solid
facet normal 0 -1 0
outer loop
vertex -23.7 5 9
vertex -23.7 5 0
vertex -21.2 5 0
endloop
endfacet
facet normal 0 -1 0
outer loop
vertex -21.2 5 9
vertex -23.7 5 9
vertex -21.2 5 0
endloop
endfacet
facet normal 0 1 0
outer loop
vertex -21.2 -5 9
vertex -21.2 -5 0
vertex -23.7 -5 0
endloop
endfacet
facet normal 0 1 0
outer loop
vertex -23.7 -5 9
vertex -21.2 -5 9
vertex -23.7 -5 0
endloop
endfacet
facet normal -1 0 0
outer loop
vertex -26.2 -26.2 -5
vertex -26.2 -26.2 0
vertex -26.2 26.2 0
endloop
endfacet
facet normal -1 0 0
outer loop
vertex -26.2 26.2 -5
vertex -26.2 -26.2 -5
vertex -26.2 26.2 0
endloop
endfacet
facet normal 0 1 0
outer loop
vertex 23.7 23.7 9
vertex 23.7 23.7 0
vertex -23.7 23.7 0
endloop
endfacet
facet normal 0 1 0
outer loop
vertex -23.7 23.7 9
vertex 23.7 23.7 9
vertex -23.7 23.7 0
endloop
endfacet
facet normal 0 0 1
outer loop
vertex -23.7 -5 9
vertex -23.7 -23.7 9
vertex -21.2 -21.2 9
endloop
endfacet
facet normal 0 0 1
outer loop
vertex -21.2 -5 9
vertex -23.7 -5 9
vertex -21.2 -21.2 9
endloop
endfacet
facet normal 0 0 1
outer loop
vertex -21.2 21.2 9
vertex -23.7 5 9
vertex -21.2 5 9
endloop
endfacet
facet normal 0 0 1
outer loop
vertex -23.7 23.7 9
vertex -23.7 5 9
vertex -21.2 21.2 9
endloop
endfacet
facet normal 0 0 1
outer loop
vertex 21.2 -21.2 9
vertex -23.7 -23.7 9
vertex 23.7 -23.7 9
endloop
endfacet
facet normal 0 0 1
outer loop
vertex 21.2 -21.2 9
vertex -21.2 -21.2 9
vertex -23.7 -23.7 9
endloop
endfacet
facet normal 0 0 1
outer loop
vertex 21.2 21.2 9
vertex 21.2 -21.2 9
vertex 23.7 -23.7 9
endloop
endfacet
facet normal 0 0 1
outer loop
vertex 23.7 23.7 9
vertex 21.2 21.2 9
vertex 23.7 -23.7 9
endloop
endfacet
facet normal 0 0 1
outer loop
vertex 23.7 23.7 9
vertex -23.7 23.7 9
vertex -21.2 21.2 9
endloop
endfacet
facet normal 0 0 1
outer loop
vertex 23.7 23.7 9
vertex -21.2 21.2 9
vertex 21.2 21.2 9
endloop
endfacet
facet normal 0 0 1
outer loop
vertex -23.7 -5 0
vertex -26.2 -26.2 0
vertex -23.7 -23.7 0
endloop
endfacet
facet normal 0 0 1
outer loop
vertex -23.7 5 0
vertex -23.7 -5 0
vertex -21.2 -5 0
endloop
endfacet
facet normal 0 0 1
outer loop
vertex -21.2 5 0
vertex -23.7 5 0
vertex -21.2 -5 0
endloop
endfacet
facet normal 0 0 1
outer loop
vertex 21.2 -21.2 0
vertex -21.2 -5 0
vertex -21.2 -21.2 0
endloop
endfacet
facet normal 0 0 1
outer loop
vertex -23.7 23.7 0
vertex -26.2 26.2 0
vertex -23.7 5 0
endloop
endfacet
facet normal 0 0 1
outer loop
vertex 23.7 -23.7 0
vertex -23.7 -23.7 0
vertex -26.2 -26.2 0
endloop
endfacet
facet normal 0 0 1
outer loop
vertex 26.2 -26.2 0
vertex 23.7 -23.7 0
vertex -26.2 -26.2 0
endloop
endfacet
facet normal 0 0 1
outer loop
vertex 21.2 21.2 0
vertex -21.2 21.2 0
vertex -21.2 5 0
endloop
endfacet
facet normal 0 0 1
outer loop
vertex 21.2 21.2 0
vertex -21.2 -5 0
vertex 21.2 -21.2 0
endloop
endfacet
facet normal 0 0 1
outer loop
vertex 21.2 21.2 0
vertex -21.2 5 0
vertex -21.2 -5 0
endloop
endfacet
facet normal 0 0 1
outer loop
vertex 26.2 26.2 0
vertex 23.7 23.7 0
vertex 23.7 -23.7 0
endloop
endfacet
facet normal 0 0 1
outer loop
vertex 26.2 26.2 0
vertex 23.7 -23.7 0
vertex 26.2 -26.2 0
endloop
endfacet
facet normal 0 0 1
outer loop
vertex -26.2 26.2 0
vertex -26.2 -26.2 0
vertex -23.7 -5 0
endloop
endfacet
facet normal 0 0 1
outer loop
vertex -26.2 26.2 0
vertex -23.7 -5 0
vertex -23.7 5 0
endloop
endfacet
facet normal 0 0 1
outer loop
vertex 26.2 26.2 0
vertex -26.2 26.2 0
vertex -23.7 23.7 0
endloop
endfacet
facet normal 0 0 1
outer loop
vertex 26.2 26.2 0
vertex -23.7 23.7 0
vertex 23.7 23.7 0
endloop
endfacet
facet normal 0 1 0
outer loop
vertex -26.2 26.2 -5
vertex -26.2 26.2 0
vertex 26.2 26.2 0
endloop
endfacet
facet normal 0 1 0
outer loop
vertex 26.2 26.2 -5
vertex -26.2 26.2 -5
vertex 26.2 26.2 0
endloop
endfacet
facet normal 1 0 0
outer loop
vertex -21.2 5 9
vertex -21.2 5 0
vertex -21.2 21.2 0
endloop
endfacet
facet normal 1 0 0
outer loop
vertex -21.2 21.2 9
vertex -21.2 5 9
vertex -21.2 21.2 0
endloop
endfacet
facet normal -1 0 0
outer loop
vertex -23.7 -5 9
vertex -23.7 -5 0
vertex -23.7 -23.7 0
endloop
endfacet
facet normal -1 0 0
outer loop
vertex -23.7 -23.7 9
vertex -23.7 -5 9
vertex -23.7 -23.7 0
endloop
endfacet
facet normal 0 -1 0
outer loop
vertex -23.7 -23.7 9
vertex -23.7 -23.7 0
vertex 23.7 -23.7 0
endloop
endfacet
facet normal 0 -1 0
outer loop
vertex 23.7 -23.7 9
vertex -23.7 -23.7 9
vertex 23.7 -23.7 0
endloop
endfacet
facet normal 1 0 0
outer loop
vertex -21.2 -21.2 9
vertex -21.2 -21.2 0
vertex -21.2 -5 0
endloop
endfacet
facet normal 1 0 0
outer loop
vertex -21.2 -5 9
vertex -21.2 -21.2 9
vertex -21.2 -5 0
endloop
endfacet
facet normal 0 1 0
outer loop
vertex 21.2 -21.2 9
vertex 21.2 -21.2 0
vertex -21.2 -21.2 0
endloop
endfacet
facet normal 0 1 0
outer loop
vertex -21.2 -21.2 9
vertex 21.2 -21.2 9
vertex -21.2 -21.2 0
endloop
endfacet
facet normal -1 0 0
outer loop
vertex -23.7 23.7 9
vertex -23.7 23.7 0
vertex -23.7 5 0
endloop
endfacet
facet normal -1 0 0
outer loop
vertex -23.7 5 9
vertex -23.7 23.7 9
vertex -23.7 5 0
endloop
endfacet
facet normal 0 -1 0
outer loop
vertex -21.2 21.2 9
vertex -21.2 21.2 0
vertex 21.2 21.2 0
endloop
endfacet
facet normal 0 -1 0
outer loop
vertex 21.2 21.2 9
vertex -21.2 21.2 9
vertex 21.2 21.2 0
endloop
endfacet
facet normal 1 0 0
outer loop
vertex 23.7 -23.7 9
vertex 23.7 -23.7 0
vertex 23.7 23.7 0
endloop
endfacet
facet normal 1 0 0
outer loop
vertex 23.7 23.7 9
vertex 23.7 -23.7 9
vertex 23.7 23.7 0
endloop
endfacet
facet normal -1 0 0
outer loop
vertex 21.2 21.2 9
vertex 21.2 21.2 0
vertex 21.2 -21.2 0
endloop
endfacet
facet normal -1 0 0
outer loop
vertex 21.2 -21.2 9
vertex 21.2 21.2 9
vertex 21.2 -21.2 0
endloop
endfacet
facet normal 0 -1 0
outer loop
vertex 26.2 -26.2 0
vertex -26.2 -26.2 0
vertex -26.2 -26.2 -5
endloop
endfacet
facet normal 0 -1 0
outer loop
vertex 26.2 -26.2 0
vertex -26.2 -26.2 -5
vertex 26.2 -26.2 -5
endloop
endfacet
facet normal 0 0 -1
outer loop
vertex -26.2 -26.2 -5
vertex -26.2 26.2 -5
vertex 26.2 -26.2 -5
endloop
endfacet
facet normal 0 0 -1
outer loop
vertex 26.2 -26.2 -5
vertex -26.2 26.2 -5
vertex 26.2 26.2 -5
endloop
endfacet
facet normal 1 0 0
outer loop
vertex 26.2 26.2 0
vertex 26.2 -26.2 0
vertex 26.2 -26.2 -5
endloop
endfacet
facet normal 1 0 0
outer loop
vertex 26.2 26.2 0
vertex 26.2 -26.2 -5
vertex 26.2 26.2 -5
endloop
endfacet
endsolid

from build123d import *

# Parameters (mm, degrees)
F1_DEPTH = 9
F2_W     = 52.4
F2_H     = 52.4
F3_DEPTH = 5


with BuildPart() as f1:
    # F0 (on Top) → F1 (new body)
    with BuildSketch(Plane.XY):
        Polygon((-21.2, 21.2), (21.2, 21.2), (21.2, -21.2), (-21.2, -21.2), (-21.2, -5), (-23.7, -5), (-23.7, -23.7), (23.7, -23.7), (23.7, 23.7), (-23.7, 23.7), (-23.7, 5), (-21.2, 5), align=None)
    extrude(amount=F1_DEPTH)

    # F2 (on Top) → F3 (join)
    with BuildSketch(Plane.XY):
        Rectangle(F2_W, F2_H)
    extrude(amount=-F3_DEPTH)


solid = f1.part
